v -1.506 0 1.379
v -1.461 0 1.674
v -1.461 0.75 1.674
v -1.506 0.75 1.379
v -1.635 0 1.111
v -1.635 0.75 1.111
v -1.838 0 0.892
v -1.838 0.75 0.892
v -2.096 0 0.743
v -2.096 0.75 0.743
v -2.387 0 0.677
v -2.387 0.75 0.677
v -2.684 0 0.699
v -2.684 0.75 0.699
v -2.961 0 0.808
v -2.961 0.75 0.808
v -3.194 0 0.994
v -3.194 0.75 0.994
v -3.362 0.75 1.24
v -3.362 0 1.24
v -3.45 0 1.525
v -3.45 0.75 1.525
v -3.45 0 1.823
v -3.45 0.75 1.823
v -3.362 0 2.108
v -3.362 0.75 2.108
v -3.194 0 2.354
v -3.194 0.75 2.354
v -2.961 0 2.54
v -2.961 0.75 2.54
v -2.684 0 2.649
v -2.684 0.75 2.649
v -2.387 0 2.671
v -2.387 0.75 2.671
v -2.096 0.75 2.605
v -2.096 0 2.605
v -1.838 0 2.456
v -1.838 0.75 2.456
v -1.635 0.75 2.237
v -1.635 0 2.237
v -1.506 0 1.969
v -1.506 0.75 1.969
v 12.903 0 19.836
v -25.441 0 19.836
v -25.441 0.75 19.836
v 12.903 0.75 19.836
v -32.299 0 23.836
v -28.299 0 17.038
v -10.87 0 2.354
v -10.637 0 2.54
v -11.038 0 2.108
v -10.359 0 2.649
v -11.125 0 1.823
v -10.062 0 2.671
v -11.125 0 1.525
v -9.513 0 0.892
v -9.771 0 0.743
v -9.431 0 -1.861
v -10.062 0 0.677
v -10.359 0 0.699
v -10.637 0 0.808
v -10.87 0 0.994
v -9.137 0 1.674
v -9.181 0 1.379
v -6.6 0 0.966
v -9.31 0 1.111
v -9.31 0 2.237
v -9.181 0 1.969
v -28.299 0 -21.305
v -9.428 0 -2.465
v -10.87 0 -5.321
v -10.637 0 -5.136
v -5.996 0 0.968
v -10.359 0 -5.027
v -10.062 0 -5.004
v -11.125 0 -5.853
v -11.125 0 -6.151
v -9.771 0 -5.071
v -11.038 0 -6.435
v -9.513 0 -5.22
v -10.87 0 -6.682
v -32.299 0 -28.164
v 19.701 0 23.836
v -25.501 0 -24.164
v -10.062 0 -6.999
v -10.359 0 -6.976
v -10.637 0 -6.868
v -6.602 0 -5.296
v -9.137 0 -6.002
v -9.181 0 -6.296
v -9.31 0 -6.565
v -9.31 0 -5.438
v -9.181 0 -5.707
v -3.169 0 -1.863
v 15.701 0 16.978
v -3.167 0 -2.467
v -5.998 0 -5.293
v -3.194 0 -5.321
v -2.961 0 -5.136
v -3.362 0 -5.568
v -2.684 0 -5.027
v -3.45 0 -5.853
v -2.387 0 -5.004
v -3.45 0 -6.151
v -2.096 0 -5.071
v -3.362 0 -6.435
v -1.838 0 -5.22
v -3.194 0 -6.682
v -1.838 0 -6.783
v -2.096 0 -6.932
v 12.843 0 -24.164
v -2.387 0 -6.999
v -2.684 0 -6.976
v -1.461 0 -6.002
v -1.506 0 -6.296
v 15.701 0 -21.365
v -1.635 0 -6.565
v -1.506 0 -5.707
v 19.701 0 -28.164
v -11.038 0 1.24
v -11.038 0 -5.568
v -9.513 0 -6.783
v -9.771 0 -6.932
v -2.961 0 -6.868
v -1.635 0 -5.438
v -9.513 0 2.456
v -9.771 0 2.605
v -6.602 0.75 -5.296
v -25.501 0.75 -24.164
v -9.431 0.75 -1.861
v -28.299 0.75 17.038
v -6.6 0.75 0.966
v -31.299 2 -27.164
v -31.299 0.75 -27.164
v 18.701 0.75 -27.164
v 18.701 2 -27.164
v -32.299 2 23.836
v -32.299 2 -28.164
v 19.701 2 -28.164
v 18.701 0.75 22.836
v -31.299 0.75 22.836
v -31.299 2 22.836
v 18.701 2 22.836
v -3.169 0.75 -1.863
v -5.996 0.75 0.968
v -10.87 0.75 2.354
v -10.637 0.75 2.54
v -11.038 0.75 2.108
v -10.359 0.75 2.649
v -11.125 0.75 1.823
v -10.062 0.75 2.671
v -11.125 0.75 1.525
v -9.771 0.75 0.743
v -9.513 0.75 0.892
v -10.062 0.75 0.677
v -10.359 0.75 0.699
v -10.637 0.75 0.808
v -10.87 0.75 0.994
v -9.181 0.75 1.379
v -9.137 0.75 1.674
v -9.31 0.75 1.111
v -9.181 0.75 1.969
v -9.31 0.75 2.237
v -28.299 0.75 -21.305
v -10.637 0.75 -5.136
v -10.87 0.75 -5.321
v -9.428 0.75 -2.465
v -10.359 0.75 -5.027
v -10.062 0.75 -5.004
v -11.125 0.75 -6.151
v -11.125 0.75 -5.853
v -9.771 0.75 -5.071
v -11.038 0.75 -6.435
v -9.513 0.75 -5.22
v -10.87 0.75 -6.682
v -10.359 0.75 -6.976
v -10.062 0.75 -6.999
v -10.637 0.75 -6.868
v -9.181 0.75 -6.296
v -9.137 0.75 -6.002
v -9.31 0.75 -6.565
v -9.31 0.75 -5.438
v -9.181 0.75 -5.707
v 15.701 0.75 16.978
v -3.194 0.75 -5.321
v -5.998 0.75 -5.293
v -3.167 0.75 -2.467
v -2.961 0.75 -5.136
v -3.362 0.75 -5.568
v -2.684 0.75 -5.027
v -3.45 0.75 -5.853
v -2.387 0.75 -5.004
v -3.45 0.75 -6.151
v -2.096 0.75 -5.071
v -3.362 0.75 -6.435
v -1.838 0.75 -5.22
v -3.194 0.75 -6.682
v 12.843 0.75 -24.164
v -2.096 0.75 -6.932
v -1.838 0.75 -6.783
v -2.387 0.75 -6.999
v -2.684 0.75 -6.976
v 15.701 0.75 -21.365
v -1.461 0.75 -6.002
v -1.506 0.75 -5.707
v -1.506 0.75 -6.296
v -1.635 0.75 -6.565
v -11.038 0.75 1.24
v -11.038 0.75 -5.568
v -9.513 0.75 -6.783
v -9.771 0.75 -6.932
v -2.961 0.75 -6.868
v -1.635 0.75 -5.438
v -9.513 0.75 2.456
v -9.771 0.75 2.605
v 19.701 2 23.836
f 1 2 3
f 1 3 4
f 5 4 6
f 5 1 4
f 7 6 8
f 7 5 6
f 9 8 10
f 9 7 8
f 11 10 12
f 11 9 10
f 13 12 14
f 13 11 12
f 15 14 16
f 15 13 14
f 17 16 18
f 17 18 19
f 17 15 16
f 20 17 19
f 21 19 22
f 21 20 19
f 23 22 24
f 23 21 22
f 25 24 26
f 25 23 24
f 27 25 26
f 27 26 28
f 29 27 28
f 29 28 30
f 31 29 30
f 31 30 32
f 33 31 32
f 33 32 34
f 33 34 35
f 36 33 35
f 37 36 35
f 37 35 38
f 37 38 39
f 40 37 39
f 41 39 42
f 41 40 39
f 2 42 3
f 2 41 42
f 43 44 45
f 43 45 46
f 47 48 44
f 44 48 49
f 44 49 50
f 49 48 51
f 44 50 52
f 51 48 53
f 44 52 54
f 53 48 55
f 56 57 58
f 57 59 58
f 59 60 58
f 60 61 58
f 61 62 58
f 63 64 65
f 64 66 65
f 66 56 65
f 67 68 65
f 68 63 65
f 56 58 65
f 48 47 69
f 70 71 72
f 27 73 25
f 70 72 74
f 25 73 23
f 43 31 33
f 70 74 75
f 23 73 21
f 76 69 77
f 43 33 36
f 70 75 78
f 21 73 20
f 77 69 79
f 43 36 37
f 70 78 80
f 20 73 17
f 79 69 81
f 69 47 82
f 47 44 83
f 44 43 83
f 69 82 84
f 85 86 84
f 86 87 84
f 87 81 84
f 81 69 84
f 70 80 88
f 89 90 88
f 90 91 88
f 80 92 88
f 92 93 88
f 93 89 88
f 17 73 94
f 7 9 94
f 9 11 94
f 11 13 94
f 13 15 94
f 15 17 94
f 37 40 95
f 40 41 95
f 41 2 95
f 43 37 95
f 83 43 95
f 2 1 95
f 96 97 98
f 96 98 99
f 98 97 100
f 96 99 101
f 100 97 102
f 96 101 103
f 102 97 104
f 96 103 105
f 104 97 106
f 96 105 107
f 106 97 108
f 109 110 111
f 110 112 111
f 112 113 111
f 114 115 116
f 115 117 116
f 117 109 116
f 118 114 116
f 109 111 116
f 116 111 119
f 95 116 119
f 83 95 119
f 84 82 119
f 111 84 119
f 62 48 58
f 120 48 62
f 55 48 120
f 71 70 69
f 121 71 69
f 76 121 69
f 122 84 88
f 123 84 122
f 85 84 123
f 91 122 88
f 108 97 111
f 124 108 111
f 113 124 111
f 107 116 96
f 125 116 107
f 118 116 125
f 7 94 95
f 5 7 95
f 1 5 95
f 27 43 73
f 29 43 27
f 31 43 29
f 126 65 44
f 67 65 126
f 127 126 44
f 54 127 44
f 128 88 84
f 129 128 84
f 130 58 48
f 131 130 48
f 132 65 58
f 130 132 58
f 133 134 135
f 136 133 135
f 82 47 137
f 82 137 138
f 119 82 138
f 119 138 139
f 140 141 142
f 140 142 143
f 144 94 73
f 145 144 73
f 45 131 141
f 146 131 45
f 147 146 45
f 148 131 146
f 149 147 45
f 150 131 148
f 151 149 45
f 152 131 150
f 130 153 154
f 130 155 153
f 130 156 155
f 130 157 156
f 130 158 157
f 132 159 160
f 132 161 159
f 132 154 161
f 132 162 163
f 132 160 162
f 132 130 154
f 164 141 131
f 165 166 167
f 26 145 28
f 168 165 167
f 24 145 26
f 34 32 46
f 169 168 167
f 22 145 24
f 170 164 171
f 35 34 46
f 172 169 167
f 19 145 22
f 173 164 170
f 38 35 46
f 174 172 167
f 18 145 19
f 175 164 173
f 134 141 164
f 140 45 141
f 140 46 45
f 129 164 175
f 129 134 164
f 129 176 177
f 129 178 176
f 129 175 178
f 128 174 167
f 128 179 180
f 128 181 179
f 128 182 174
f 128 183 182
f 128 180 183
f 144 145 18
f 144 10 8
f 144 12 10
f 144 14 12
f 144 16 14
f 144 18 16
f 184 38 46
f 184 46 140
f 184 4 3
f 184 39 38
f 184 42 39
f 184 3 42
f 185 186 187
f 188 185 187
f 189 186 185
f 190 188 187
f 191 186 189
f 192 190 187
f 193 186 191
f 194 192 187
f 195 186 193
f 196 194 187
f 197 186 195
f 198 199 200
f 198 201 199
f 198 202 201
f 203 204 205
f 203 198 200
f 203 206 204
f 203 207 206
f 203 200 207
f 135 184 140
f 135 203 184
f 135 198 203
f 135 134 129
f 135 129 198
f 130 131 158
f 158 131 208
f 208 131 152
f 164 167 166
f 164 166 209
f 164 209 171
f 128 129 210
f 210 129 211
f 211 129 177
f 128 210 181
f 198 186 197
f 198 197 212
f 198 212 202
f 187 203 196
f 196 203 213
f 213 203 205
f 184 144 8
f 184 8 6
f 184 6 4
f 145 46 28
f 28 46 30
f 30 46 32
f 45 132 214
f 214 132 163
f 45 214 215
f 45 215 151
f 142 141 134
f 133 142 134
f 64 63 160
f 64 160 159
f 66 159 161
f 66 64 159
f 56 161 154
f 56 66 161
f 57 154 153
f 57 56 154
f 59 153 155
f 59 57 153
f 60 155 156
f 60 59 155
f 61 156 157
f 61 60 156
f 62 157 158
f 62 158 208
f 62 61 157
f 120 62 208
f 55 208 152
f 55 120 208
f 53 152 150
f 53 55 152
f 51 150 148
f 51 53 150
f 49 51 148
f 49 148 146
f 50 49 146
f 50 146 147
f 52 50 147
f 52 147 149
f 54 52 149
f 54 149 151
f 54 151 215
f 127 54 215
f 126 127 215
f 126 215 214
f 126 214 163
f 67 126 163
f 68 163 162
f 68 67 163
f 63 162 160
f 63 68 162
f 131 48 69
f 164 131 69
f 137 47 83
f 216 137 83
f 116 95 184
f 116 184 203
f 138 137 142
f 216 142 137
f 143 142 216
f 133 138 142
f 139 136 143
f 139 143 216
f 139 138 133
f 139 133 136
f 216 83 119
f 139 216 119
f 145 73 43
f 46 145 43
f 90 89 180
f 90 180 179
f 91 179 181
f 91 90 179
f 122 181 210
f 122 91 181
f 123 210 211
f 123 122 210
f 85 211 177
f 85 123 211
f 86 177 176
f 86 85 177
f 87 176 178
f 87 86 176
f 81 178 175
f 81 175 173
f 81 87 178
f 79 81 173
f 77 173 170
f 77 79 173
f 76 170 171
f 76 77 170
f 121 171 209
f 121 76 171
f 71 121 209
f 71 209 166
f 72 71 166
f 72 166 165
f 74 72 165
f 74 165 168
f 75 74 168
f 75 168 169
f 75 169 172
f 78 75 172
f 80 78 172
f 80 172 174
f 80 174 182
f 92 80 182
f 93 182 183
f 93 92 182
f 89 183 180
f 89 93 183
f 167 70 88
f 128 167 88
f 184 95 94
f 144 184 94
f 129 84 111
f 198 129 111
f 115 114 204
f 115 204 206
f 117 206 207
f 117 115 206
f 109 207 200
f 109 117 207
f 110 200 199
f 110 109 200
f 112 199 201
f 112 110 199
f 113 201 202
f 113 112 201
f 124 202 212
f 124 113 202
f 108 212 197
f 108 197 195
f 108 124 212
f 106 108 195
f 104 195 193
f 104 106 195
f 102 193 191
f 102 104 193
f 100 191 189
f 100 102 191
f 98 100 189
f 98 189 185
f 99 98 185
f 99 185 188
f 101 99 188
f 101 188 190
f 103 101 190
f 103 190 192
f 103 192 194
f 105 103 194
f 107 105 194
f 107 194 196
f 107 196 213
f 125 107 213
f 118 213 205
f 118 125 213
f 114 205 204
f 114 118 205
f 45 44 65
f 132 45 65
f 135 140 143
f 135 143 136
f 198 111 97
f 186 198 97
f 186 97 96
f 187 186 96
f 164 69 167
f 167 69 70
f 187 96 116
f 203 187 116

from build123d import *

# Parameters (mm, degrees)
SKETCH1_W           = 50
SKETCH1_H           = 50
SKETCH1_W_2         = 44
SKETCH1_H_2         = 44
EXTRUDE_THIN1_DEPTH = 0.75
SKETCH1_3_R         = 1
BOSS_EXTRUDE1_DEPTH = 0.75
SKETCH1_4_W         = 52
SKETCH1_4_H         = 52
SKETCH1_4_W_2       = 50
SKETCH1_4_H_2       = 50
EXTRUDE_THIN2_DEPTH = 2


with BuildPart() as part:
    # Sketch1 → Extrude-Thin1 (new body)
    with BuildSketch(Plane(origin=(0, 0, 0), x_dir=(1, 0, 0), z_dir=(0, 1, 0))):
        with Locations((-6.298946979, 2.1638593)):
            Rectangle(SKETCH1_W, SKETCH1_H)
        with Locations((-6.298946979, 2.1638593)):
            Rectangle(SKETCH1_W_2, SKETCH1_H_2, mode=Mode.SUBTRACT)
    extrude(amount=EXTRUDE_THIN1_DEPTH)

    # Sketch1<3> → Boss-Extrude1 (add)
    # profile 1 of 4: a face of its own
    with BuildSketch(Plane(origin=(0, 0, 0), x_dir=(1, 0, 0), z_dir=(0, 1, 0))):
        Polygon((-9.430665417, 1.860567093), (-31.298946979, -20.042512046), (-31.298946979, -22.8361407), (-28.435774882, -22.8361407), (-6.59999063, -0.965610581), align=None)
        with Locations((-10.136648367, -1.673842088)):
            Circle(SKETCH1_3_R, mode=Mode.SUBTRACT)
    # profile 2 of 4: a face of its own
    with BuildSketch(Plane(origin=(0, 0, 0), x_dir=(1, 0, 0), z_dir=(0, 1, 0))):
        Polygon((-5.995654771, -0.967859138), (15.907424367, -22.8361407), (18.701053021, -22.8361407), (18.701053021, -19.972968602), (-3.169477097, 1.86281565), align=None)
        with Locations((-2.461245591, -1.673842088)):
            Circle(SKETCH1_3_R, mode=Mode.SUBTRACT)
    # profile 3 of 4: a face of its own
    with BuildSketch(Plane(origin=(0, 0, 0), x_dir=(1, 0, 0), z_dir=(0, 1, 0))):
        Polygon((18.701053021, 27.1638593), (15.837880924, 27.1638593), (-5.997903328, 5.293329182), (-3.167228541, 2.467151508), (18.701053021, 24.370230647), align=None)
        with Locations((-2.461245591, 6.001560689)):
            Circle(SKETCH1_3_R, mode=Mode.SUBTRACT)
    # profile 4 of 4: a face of its own
    with BuildSketch(Plane(origin=(0, 0, 0), x_dir=(1, 0, 0), z_dir=(0, 1, 0))):
        Polygon((-31.298946979, 27.1638593), (-31.298946979, 24.300687203), (-9.428416861, 2.464902951), (-6.602239187, 5.295577739), (-28.505318325, 27.1638593), align=None)
        with Locations((-10.136648367, 6.001560689)):
            Circle(SKETCH1_3_R, mode=Mode.SUBTRACT)
    extrude(amount=BOSS_EXTRUDE1_DEPTH)

    # Sketch1<4> → Extrude-Thin2 (add)
    with BuildSketch(Plane(origin=(0, 0, 0), x_dir=(1, 0, 0), z_dir=(0, 1, 0))):
        with Locations((-6.298946979, 2.1638593)):
            Rectangle(SKETCH1_4_W, SKETCH1_4_H)
        with Locations((-6.298946979, 2.1638593)):
            Rectangle(SKETCH1_4_W_2, SKETCH1_4_H_2, mode=Mode.SUBTRACT)
    extrude(amount=EXTRUDE_THIN2_DEPTH)


solid = part.part
